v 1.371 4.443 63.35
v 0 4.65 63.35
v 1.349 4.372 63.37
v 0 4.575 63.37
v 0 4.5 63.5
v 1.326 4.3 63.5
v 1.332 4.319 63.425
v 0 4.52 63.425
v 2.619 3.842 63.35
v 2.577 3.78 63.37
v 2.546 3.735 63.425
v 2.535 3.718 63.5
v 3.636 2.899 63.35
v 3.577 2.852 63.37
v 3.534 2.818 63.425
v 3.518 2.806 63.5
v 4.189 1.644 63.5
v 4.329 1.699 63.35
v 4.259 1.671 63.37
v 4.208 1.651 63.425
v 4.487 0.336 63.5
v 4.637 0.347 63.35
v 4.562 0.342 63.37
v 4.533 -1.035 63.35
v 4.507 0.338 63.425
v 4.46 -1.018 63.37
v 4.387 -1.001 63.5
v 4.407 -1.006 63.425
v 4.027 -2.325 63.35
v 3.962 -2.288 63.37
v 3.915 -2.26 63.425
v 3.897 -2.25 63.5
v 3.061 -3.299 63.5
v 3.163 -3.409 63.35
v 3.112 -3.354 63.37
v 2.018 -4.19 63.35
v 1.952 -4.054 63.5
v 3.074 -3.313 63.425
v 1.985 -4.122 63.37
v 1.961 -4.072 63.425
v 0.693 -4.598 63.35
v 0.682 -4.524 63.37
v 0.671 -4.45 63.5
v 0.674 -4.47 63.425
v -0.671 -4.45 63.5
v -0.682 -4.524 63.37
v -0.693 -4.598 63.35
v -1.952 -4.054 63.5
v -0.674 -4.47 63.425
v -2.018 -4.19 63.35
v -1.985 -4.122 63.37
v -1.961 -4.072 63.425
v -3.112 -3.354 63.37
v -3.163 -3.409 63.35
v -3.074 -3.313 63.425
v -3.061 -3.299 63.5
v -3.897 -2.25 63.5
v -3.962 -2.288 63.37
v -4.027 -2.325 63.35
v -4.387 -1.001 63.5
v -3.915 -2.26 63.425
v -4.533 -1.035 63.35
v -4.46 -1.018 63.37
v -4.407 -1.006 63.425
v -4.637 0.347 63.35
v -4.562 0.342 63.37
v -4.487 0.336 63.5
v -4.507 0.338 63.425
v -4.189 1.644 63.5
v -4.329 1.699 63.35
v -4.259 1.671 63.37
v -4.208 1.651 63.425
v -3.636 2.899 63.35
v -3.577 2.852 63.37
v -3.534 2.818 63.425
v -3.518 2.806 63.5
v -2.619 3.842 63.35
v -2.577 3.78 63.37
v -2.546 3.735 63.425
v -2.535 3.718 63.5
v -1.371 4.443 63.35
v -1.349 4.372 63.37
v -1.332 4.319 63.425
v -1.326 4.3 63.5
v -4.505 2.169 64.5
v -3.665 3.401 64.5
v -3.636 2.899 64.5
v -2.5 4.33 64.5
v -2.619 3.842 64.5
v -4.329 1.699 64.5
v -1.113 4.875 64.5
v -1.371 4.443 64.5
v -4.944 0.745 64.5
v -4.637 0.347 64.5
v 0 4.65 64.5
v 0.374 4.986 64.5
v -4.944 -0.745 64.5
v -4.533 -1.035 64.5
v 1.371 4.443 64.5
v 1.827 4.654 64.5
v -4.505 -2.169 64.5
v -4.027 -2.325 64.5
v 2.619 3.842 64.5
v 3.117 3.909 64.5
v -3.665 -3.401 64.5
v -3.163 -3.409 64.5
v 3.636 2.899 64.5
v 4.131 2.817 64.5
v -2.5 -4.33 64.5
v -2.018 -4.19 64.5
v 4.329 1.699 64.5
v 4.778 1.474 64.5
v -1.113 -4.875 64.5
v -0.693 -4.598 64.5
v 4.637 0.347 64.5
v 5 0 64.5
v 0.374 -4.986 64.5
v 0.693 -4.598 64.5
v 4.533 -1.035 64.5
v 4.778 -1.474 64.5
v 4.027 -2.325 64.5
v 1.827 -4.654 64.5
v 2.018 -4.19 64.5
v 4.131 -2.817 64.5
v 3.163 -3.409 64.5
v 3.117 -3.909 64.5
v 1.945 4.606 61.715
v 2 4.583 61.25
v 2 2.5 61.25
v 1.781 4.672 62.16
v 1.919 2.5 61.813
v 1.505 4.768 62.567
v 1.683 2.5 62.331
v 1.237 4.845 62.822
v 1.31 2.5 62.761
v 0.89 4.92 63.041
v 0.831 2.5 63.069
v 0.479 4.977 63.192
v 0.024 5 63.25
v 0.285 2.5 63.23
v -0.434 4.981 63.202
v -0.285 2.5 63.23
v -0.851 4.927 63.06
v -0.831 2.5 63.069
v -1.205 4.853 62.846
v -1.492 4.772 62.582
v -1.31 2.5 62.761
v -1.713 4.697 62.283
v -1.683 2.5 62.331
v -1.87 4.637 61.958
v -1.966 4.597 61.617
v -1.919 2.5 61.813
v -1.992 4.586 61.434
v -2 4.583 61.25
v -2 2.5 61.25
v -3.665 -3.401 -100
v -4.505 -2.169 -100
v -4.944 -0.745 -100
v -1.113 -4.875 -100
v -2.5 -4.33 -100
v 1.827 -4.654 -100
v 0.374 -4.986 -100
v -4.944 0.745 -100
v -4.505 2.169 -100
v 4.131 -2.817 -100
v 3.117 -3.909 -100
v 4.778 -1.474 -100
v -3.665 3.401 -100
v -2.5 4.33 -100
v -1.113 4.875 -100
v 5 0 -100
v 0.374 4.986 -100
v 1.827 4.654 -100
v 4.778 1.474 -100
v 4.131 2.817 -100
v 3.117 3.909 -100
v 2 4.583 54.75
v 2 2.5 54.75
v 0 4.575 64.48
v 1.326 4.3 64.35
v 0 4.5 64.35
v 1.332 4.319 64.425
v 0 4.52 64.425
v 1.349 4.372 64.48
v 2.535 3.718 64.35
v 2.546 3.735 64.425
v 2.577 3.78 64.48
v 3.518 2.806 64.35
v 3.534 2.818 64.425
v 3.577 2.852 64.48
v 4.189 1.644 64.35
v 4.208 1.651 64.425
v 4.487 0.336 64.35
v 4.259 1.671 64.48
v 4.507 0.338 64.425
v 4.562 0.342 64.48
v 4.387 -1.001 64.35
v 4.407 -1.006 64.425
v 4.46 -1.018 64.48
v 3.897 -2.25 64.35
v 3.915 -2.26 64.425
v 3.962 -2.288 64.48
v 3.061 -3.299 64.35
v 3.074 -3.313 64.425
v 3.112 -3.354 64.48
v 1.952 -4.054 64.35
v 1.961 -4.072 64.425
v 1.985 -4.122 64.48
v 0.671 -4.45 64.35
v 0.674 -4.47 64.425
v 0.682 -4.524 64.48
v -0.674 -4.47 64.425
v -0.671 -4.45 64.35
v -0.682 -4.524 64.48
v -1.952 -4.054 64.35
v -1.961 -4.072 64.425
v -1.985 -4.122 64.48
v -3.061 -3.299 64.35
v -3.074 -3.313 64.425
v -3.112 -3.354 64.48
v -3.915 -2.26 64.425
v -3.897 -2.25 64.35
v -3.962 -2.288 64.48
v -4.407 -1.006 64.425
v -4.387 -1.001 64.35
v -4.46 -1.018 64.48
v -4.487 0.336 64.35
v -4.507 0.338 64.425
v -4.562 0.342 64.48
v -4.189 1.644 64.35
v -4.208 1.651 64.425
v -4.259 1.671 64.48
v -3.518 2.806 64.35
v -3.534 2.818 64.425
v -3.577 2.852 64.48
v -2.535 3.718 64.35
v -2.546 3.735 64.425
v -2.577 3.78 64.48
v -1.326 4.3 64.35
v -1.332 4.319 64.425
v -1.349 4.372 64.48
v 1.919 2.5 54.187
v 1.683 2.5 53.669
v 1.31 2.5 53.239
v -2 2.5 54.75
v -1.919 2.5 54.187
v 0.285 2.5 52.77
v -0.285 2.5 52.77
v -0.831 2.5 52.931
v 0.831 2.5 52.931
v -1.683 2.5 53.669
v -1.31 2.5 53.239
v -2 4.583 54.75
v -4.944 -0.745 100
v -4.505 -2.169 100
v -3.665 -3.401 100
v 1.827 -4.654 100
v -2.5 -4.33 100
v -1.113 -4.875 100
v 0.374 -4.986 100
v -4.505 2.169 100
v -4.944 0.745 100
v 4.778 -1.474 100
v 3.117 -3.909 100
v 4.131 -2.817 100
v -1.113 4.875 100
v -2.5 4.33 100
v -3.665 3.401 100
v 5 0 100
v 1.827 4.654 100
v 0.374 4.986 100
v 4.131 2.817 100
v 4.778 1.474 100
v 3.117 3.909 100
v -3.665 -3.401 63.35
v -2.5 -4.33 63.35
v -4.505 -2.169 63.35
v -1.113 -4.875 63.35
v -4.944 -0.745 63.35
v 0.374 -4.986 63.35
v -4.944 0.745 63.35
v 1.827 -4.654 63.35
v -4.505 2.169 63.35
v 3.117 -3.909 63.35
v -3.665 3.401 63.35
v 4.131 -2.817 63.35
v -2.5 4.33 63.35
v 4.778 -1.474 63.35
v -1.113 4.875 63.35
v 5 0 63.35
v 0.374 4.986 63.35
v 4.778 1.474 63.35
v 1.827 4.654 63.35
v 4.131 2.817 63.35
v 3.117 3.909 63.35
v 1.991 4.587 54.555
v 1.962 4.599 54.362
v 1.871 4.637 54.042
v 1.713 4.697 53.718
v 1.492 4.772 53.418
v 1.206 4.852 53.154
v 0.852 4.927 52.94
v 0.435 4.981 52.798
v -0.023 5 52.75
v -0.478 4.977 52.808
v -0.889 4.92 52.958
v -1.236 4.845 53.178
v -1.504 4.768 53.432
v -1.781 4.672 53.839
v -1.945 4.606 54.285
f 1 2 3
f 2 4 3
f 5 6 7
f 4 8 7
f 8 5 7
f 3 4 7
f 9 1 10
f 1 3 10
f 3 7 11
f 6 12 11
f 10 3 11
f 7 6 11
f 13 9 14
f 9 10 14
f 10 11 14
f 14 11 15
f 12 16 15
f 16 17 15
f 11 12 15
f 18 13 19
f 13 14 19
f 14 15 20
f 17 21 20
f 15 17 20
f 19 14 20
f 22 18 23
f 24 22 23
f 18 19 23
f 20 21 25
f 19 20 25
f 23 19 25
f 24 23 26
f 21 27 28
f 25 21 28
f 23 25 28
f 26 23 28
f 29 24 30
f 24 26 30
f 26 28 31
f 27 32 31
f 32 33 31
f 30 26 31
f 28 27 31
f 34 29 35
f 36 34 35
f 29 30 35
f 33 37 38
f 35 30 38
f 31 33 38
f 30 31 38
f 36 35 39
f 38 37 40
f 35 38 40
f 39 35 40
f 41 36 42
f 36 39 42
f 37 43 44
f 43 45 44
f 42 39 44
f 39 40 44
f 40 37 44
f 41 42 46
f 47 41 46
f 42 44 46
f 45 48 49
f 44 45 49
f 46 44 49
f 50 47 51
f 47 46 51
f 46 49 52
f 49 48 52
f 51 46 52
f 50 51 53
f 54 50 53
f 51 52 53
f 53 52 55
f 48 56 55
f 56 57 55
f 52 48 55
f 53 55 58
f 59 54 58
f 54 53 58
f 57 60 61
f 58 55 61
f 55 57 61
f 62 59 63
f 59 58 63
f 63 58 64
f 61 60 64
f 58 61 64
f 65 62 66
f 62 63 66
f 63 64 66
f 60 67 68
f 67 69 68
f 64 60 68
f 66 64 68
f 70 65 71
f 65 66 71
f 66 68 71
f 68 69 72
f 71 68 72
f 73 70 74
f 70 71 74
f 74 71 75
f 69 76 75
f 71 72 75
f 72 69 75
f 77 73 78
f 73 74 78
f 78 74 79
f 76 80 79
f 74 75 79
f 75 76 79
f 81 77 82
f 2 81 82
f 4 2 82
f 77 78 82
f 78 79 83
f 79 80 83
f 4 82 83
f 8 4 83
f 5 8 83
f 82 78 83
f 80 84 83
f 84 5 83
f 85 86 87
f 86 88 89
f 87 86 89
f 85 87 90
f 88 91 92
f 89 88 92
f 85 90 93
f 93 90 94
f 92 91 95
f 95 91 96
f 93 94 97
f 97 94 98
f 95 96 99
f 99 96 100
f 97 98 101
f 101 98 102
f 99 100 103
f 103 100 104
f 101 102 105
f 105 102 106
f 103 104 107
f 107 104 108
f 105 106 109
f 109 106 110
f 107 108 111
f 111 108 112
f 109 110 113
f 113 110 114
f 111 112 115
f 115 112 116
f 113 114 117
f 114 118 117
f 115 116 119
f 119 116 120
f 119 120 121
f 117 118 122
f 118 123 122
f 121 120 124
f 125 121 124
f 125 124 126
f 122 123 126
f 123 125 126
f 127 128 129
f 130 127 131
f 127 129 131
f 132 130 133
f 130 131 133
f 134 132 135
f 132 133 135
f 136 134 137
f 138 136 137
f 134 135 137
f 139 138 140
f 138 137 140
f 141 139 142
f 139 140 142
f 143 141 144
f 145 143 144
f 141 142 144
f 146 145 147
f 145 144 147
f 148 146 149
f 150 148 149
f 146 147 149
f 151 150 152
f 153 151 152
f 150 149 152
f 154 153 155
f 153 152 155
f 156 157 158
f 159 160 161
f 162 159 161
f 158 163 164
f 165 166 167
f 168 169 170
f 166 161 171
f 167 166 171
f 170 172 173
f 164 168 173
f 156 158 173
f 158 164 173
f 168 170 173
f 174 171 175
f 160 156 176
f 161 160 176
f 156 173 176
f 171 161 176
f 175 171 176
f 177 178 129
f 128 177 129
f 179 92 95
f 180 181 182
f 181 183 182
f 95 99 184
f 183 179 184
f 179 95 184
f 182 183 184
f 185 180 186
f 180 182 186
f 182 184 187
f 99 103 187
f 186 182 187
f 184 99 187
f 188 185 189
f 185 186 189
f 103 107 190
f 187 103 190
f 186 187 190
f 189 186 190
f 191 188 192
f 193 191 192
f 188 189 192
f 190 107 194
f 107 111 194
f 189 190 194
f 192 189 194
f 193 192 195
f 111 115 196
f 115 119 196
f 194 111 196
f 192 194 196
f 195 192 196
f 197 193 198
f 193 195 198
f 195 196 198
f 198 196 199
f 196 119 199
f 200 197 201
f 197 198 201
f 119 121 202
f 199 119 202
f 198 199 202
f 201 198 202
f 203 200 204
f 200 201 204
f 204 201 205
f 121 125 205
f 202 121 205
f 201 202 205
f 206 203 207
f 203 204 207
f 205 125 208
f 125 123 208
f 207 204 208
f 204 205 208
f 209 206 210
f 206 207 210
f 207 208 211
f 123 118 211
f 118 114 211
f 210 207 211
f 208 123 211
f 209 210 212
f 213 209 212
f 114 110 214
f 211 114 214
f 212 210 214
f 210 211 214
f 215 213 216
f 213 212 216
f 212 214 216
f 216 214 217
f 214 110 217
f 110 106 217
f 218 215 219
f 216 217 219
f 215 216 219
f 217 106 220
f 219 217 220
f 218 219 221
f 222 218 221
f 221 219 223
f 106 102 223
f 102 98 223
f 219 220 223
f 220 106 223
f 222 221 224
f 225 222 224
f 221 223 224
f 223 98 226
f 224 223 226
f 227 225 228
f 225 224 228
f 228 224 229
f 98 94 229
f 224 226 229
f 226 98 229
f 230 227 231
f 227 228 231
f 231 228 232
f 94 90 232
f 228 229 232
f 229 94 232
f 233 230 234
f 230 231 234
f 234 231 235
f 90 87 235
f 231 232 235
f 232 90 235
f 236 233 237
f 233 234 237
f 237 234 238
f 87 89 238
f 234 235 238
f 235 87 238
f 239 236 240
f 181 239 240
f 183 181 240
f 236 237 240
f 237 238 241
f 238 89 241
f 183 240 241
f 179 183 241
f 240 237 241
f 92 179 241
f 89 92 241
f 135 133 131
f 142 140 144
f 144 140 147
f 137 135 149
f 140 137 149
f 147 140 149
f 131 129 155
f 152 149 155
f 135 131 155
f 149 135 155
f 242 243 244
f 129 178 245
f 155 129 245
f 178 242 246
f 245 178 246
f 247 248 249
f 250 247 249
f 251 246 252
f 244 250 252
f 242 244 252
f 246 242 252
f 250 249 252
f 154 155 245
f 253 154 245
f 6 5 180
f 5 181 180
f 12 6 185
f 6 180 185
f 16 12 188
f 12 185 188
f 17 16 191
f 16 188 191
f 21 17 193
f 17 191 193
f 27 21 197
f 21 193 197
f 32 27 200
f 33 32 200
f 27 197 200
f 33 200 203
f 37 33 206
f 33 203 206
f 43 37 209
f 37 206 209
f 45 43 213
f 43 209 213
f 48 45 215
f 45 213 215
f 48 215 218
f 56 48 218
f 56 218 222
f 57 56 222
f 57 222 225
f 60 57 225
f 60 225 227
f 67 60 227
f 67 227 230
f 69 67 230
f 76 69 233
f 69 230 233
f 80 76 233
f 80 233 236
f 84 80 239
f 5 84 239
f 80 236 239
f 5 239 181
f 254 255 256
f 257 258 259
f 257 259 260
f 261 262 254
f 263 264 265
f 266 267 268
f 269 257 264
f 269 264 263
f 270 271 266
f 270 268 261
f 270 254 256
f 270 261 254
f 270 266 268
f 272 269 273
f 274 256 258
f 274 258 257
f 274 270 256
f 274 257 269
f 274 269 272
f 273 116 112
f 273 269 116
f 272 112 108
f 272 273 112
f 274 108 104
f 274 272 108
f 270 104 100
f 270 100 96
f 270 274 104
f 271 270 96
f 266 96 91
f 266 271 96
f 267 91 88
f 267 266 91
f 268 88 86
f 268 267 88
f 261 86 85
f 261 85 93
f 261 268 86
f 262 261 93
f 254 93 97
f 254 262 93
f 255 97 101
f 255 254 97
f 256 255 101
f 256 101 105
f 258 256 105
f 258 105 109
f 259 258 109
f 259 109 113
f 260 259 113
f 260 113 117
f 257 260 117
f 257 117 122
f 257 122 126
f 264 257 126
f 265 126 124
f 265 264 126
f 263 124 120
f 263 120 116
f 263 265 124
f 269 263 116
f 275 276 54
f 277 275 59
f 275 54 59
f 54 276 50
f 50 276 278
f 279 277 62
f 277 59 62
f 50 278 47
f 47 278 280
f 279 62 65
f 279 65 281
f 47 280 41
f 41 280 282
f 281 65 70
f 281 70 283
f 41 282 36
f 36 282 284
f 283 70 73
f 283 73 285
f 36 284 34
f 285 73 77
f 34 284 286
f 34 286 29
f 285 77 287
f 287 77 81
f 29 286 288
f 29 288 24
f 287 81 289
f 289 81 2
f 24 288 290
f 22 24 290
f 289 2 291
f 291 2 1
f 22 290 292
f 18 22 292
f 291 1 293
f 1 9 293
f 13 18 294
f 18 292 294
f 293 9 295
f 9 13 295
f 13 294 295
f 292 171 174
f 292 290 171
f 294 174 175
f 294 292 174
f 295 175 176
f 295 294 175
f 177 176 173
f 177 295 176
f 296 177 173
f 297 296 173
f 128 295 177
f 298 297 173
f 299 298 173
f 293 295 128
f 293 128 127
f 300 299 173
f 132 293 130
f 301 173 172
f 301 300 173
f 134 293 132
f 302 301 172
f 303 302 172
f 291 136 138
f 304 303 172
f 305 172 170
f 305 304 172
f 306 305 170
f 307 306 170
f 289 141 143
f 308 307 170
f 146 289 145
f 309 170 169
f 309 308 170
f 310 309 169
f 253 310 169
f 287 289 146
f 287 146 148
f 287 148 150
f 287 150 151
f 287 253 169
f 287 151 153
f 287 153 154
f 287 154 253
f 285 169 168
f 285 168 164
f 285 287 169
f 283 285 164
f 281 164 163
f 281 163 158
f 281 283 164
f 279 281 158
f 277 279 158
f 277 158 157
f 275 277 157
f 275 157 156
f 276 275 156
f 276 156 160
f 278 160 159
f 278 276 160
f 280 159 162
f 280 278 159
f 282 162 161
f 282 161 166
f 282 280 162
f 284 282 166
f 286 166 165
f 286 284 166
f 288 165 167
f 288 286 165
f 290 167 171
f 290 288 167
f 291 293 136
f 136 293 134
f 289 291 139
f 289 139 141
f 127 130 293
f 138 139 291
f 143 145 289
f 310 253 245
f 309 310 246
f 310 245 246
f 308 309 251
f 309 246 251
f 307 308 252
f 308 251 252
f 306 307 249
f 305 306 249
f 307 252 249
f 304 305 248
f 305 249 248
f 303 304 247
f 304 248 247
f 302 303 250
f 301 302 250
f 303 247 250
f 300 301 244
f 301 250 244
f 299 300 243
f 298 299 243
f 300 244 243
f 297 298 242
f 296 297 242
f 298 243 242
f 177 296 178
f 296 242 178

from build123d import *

# Parameters (mm, degrees)
CROQUIS1_R              = 5
SALIENTE_EXTRUIR1_DEPTH = 100
CORTAR_EXTRUIR1_START   = 2.5
CORTAR_EXTRUIR1_DEPTH   = 98.749688279


with BuildPart() as part:
    # Croquis1 → Saliente-Extruir1 (new, symmetric)
    with BuildSketch(Plane.XY):
        Circle(CROQUIS1_R)
    extrude(amount=SALIENTE_EXTRUIR1_DEPTH, both=True)

    # Croquis2 → Cortar-Extruir1 (cut, through all)
    with BuildSketch(Plane(origin=(0, 0, 0), x_dir=(1, 0, 0), z_dir=(0, 1, 0)).offset(CORTAR_EXTRUIR1_START)):
        with BuildLine():
            Line((2, -54.75), (2, -61.25))
            ThreePointArc((2, -61.25), (0, -63.25), (-2, -61.25))
            Line((-2, -61.25), (-2, -54.75))
            ThreePointArc((-2, -54.75), (0, -52.75), (2, -54.75))
        make_face()
    extrude(amount=CORTAR_EXTRUIR1_DEPTH, mode=Mode.SUBTRACT)

    # Croquis4 → Ranura para arandela de seguridad para ejes DIN 6799 - 91 (revolve, cut)
    with BuildSketch(Plane(origin=(0, 0, 100), x_dir=(0, 1, 0), z_dir=(-1, 0, 0))):
        with BuildLine():
            Line((4.65, 35.5), (6.641427447, 35.5))
            Line((6.641427447, 35.5), (6.641427447, 36.65))
            Line((6.641427447, 36.65), (4.65, 36.65))
            ThreePointArc((4.65, 36.65), (4.543933983, 36.606066017), (4.5, 36.5))
            Line((4.5, 36.5), (4.5, 35.65))
            ThreePointArc((4.5, 35.65), (4.543933983, 35.543933983), (4.65, 35.5))
        make_face()
    revolve(axis=Axis((0, 0, 150), (0, 0, -1)), mode=Mode.SUBTRACT)


solid = part.part
